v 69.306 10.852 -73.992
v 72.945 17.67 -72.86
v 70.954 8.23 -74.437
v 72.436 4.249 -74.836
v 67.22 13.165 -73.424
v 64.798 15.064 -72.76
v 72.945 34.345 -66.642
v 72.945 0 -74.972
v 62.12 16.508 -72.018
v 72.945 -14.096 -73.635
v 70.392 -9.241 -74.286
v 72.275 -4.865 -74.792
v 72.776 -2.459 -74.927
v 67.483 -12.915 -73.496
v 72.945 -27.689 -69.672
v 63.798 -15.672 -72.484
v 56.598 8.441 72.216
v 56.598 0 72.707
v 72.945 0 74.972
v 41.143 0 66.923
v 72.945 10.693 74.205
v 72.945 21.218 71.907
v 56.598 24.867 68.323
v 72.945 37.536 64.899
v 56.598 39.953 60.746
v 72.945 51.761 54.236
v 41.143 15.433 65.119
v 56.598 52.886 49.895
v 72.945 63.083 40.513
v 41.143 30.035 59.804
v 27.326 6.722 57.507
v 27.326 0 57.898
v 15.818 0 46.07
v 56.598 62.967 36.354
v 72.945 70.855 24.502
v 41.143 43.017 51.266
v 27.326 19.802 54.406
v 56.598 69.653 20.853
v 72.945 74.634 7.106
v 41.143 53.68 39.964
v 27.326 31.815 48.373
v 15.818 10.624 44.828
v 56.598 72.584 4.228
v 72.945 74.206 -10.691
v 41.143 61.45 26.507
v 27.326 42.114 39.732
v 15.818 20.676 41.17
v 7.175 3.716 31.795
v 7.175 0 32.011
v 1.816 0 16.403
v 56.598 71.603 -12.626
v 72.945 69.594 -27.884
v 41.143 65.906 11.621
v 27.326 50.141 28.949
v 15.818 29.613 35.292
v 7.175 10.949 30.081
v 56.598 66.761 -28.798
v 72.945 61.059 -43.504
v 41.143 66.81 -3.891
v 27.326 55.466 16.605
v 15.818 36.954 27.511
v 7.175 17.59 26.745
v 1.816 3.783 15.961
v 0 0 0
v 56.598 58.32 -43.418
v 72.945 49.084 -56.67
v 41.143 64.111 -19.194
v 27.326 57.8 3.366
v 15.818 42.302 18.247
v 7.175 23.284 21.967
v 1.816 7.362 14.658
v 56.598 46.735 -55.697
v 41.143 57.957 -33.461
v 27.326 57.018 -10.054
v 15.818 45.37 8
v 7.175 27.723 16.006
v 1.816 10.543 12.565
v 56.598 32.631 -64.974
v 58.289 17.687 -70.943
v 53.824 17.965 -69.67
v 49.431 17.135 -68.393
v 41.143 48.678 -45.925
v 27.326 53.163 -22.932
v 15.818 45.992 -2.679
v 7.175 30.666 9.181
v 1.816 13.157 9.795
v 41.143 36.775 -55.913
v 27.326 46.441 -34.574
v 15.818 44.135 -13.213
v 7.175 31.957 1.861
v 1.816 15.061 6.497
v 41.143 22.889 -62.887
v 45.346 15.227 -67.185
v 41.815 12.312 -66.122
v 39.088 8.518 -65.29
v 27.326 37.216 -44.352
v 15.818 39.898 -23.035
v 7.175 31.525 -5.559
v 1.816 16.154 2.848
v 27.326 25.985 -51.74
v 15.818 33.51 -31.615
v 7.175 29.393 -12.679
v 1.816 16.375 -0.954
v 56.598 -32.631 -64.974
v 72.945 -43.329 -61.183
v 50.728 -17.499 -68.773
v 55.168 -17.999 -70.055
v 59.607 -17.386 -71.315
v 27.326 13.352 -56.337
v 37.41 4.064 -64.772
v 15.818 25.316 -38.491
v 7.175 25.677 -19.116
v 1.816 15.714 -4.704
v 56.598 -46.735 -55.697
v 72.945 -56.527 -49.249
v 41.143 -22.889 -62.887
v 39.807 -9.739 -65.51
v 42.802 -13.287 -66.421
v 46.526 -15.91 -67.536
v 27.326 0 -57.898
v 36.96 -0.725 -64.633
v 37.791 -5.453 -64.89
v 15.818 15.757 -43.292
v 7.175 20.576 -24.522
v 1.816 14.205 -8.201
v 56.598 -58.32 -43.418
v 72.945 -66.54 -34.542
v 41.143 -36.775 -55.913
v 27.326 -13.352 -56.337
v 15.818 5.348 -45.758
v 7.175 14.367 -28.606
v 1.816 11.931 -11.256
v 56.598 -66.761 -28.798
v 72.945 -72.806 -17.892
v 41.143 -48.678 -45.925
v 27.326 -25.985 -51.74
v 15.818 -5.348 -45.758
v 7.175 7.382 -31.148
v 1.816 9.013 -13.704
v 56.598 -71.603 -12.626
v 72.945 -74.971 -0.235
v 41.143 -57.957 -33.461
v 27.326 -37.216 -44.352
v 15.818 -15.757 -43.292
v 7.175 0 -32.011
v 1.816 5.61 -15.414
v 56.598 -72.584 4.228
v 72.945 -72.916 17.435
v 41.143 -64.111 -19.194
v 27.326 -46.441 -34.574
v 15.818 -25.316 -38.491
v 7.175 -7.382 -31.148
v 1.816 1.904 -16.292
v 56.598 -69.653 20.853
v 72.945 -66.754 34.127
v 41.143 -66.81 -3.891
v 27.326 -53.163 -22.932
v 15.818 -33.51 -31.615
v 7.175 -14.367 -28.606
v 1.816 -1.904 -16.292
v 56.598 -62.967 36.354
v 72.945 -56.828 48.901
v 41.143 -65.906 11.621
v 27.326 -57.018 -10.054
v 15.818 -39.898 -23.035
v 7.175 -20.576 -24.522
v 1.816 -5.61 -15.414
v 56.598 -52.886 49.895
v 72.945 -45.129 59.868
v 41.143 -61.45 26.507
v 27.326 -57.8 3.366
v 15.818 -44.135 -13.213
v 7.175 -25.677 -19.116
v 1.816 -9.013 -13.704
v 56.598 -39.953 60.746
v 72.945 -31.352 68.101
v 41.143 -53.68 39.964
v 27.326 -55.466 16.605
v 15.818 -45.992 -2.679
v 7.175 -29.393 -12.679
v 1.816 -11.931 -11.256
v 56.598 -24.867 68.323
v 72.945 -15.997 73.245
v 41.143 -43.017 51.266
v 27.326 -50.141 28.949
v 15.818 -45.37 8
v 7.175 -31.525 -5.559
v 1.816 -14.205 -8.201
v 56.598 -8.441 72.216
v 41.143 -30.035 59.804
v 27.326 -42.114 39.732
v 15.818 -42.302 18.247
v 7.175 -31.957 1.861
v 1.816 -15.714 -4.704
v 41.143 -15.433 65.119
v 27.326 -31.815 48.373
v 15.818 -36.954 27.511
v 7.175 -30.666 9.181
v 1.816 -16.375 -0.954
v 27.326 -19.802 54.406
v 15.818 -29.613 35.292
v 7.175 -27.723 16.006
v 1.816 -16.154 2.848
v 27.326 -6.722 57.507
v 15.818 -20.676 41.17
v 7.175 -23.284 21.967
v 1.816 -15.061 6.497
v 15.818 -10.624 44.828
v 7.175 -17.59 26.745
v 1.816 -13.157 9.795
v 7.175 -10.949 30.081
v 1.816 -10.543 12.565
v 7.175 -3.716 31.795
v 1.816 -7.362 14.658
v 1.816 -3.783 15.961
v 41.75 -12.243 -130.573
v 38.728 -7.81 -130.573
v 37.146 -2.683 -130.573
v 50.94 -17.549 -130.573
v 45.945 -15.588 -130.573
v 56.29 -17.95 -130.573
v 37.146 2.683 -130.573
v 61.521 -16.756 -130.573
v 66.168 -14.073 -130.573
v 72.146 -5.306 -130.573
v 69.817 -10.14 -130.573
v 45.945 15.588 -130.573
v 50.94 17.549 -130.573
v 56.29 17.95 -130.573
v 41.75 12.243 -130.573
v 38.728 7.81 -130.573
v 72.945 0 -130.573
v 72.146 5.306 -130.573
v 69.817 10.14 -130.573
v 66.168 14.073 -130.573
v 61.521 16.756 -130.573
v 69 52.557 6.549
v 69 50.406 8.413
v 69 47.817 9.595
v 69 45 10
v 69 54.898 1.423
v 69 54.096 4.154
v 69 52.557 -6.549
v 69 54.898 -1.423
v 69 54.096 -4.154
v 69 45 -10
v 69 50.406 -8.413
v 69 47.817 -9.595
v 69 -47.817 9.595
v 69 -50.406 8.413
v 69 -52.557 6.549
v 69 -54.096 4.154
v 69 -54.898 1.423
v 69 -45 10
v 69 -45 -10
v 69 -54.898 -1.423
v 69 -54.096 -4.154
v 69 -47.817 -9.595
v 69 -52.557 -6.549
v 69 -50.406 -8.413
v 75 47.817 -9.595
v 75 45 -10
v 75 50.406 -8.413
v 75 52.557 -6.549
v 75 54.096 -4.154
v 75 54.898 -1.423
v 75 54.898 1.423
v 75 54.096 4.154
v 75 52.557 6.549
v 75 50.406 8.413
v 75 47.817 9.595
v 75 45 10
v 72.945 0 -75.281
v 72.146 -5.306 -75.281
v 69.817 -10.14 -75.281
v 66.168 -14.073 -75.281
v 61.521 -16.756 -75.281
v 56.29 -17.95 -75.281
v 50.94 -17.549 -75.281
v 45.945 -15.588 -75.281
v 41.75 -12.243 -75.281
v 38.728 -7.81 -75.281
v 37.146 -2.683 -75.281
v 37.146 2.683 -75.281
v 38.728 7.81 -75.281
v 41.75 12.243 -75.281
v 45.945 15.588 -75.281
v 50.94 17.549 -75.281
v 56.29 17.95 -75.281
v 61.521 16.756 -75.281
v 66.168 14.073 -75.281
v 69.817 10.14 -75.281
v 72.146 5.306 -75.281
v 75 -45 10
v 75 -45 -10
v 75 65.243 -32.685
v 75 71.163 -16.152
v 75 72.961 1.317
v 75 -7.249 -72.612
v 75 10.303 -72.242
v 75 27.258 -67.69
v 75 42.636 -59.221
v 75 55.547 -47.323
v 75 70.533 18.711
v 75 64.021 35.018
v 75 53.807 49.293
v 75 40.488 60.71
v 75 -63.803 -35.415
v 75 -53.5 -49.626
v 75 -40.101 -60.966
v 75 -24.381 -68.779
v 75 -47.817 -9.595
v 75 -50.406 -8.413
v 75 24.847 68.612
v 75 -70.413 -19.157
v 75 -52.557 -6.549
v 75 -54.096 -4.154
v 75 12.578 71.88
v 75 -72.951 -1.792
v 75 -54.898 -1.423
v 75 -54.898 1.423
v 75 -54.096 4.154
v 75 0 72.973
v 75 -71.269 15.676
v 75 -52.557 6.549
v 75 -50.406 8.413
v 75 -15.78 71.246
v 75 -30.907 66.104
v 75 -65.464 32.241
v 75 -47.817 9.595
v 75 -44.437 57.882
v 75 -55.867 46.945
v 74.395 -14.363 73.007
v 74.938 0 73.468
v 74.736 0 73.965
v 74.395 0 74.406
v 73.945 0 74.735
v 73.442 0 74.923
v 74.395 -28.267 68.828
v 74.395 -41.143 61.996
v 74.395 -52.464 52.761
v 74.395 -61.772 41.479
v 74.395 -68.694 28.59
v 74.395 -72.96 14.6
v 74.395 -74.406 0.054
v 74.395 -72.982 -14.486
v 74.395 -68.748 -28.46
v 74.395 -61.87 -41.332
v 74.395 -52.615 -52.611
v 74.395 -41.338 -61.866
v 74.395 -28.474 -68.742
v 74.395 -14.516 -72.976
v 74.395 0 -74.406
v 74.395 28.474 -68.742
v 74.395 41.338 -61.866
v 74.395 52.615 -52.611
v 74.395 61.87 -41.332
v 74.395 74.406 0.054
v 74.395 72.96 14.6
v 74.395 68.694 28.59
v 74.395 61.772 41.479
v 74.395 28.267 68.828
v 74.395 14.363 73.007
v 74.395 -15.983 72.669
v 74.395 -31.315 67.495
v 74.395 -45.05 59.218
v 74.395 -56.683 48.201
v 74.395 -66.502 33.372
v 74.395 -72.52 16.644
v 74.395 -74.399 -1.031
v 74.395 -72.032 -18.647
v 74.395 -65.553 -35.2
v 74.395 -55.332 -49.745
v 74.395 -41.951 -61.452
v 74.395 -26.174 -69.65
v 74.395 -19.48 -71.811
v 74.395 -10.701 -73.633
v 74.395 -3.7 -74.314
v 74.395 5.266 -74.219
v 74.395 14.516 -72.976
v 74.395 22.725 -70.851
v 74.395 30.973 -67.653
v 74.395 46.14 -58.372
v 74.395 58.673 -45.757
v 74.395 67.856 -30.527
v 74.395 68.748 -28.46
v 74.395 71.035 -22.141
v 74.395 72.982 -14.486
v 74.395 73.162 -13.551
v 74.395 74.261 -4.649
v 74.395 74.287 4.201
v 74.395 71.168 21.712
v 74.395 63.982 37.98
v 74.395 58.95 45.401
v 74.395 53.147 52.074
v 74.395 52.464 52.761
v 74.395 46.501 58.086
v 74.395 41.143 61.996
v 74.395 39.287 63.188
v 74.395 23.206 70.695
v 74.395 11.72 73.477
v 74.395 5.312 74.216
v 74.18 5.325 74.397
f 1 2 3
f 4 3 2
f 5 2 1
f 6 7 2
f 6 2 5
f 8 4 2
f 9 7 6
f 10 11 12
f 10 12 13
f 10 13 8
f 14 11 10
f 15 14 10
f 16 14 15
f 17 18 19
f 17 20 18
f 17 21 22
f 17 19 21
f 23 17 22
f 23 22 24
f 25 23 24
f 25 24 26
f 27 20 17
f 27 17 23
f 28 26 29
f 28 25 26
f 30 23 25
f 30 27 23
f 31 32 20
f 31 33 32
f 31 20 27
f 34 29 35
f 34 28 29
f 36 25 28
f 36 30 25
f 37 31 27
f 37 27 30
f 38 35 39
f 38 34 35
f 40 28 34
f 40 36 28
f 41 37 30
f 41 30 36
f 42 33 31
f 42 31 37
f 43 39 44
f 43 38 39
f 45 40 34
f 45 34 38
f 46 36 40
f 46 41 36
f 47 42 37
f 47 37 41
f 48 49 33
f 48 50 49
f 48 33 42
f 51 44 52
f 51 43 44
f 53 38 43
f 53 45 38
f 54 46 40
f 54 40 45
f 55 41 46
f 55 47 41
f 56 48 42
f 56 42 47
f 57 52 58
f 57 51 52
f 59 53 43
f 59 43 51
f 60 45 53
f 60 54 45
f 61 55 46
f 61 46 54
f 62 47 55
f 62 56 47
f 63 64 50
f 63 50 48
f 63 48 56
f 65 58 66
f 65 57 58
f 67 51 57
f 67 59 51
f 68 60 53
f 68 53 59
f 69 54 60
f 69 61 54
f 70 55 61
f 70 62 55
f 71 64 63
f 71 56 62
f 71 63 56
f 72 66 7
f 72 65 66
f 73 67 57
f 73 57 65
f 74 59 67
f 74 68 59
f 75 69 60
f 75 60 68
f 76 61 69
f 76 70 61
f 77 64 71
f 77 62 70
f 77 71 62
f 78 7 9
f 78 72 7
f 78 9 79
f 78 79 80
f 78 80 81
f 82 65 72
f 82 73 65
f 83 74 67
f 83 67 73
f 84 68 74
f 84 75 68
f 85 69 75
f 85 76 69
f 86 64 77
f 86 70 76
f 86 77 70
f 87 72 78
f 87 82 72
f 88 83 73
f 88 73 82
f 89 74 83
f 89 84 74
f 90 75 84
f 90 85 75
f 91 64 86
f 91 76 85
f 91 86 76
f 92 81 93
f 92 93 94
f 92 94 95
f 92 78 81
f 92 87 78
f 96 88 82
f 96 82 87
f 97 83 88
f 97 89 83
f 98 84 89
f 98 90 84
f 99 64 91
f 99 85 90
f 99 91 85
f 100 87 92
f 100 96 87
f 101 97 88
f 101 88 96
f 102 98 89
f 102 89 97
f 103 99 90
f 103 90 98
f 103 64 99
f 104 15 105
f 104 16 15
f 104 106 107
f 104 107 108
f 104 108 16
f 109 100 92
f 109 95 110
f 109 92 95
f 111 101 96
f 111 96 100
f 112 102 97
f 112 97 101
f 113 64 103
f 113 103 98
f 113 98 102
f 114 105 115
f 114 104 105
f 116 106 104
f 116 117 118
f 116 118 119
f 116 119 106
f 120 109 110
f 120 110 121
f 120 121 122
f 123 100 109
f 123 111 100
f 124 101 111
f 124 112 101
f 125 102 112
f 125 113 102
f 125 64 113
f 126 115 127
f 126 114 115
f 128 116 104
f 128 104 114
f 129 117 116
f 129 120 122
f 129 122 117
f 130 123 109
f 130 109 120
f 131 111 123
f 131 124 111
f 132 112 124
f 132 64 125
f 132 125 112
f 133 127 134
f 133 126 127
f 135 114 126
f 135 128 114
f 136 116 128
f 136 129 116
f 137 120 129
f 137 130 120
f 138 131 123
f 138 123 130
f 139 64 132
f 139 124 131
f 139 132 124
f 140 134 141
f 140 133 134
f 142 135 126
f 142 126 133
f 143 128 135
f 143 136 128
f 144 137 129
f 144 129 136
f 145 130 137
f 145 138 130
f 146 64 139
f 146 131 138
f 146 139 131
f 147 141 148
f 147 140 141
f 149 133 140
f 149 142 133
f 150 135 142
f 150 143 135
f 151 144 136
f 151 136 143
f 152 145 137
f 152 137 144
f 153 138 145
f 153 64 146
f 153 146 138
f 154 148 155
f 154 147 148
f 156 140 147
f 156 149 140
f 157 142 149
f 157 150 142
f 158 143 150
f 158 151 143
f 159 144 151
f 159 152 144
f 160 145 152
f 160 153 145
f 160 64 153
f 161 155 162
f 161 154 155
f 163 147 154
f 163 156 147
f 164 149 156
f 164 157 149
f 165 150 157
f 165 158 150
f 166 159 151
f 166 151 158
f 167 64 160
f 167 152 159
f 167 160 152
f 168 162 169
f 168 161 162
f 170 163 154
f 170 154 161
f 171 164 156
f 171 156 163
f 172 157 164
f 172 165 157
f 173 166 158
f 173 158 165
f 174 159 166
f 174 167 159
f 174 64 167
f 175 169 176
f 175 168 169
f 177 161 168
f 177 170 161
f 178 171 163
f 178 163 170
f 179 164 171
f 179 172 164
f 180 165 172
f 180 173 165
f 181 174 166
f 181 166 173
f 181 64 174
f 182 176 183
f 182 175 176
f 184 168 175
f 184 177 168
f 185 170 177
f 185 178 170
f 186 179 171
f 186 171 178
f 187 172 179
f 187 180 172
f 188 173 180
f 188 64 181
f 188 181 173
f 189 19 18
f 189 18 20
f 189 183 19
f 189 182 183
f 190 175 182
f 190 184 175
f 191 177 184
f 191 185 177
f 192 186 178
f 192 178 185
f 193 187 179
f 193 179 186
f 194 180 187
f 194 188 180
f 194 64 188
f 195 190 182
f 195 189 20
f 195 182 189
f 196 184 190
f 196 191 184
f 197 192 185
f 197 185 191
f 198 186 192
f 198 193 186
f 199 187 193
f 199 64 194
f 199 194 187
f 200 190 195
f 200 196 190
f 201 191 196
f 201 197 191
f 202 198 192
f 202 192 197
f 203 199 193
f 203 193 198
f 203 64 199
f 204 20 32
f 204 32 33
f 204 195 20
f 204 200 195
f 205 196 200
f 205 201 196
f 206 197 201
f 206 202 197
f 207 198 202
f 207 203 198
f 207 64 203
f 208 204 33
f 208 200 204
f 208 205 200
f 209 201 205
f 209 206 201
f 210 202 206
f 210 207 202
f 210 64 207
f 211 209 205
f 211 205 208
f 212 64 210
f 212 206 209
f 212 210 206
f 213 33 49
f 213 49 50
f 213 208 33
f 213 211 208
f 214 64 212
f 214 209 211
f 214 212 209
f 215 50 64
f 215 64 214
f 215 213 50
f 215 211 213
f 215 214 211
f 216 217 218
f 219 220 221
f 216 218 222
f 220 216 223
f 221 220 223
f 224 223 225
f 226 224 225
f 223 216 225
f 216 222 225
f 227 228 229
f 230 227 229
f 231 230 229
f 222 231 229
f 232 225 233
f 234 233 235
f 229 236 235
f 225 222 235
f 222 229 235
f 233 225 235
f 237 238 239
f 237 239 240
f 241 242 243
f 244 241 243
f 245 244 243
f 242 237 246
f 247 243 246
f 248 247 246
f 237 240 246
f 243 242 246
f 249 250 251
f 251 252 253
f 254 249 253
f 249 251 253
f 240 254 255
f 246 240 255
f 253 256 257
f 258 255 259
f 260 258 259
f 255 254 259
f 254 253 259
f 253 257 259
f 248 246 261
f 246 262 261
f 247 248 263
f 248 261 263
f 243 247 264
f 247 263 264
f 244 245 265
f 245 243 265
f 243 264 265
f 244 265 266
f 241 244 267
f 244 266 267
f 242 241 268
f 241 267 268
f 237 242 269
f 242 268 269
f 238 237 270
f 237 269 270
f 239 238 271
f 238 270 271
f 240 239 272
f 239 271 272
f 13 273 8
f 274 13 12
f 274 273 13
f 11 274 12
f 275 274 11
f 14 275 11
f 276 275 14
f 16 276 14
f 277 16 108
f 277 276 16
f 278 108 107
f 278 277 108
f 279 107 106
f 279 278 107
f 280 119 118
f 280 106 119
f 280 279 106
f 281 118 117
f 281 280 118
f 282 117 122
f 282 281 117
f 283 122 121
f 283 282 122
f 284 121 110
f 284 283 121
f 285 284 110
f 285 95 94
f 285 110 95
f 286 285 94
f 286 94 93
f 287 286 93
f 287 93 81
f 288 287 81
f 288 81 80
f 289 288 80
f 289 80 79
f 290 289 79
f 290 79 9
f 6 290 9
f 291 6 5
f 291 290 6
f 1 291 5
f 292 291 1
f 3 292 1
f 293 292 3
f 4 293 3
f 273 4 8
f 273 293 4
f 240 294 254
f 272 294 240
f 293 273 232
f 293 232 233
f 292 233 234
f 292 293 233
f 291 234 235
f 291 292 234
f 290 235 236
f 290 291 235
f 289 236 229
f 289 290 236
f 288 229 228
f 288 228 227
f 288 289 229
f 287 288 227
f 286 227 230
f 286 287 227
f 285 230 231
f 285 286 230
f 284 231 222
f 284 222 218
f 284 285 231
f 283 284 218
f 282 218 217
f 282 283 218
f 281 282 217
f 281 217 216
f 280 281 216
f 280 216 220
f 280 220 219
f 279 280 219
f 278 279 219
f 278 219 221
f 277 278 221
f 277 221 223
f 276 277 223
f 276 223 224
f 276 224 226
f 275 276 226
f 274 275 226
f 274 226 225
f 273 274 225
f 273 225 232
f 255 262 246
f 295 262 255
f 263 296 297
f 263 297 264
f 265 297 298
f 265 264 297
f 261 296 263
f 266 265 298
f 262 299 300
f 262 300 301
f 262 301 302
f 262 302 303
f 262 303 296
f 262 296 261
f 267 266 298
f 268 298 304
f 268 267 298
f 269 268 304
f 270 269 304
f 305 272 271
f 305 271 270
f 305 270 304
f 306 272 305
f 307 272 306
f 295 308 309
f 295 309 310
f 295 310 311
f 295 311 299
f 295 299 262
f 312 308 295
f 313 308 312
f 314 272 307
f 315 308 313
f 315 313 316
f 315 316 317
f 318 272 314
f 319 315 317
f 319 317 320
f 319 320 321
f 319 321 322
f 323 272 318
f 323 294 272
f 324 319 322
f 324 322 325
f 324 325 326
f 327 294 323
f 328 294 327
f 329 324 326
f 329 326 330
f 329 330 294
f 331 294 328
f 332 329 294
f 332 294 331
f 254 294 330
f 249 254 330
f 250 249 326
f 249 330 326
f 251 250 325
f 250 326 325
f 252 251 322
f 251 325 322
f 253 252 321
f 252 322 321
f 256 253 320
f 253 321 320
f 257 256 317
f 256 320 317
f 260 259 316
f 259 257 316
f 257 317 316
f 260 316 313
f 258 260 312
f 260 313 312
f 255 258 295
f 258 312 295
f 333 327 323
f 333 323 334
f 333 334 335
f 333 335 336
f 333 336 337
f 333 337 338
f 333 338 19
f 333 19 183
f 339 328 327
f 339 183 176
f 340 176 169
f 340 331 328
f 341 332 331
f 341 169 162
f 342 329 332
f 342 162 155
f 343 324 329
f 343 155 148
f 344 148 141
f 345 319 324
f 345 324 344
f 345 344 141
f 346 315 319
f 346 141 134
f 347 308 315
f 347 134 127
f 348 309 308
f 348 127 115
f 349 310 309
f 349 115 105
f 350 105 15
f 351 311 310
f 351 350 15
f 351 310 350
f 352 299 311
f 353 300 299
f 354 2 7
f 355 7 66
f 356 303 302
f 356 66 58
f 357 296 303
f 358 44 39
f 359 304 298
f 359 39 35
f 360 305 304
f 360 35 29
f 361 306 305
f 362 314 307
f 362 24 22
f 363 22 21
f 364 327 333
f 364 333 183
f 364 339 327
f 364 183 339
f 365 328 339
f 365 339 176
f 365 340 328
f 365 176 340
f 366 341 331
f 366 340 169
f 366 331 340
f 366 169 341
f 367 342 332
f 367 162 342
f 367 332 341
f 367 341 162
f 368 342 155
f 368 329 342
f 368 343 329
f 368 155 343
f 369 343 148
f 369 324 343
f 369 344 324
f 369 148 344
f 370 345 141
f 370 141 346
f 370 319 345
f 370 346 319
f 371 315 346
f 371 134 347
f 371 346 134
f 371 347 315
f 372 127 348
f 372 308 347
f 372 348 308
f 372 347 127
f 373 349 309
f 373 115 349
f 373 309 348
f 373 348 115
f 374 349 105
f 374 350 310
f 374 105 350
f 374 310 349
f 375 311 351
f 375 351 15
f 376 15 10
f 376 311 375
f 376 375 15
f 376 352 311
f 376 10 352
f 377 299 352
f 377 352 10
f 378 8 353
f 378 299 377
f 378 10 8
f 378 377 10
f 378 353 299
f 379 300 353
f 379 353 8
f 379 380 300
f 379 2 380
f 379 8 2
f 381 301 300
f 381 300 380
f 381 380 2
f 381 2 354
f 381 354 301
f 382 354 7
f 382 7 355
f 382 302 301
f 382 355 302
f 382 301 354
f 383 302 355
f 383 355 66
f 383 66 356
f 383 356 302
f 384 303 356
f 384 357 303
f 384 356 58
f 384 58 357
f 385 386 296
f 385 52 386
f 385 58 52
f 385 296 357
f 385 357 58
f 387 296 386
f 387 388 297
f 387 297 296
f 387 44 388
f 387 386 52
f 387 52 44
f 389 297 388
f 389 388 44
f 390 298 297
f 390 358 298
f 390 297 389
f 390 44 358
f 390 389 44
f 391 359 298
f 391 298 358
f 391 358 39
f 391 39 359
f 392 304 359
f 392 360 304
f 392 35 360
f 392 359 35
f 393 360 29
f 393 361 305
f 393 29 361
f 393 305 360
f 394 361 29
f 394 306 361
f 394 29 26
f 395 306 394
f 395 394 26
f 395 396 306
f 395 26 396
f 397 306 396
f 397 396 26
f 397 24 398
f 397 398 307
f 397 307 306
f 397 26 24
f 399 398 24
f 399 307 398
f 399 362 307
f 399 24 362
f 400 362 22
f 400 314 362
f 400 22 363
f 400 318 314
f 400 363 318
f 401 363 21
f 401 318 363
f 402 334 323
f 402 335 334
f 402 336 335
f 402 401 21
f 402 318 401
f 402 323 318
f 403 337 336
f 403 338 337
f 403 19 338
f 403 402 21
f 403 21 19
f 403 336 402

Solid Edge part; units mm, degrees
sketch "Sketch1" plane through (0, 0, 0) normal (0, -1, 0) x (1, 0, 0)
  line L0 (75, 75) -> (75, 0)
  line L1 (0, 0) -> (75, 0)
  arc A0 (75, 75) -> (0, 0) centre (75, 0) ccw
revolve "RevolvedProtrusion1" add sketch "Sketch1" angle 360 about axis through (0, 0, 0) along (1, 0, 0)
fillet "Round1" radius 2 1 edges at (75, 0, -75)
sketch "Sketch2" plane through (75, 0, 0) normal (1, 0, 0) x (0, 1, 0)
  line L0 (0, 6) -> (-45, 6)
  line L1 (0, 6) -> (45, 6)
  arc A0 (45, 6) -> (45, -6) centre (45, 0) cw
  line L2 (-45, -6) -> (45, -6)
  arc A1 (-45, -6) -> (-45, 6) centre (-45, 0) cw
extrude "ExtrudedCutout_1" cut sketch "Sketch2" against normal blind 5.8387
sketch "Sketch3" plane through (0, 0, -75.2808) normal (0, 0, 1) x (1, 0, 0)
  circle A0 centre (54.9452, 0) radius 18
extrude "ExtrudedProtrusion_4" add sketch "Sketch3" along normal blind 29
sketch "Sketch4" plane through (0, 0, -75.2808) normal (0, 0, 1) x (1, 0, 0)
  circle A0 centre (54.9452, 0) radius 18
extrude "ExtrudedProtrusion_3" add sketch "Sketch4" against normal blind 55.2919
sketch "Sketch5" plane through (75, 0, 0) normal (1, 0, 0) x (0, 1, 0)
  line L0 (-45, 10) -> (45, 10)
  line L1 (45, -10) -> (-45, -10)
  arc A0 (45, 10) -> (45, -10) centre (45, 0) cw
  arc A1 (-45, -10) -> (-45, 10) centre (-45, 0) cw
extrude "ExtrudedCutout_3" cut sketch "Sketch5" against normal blind 6
